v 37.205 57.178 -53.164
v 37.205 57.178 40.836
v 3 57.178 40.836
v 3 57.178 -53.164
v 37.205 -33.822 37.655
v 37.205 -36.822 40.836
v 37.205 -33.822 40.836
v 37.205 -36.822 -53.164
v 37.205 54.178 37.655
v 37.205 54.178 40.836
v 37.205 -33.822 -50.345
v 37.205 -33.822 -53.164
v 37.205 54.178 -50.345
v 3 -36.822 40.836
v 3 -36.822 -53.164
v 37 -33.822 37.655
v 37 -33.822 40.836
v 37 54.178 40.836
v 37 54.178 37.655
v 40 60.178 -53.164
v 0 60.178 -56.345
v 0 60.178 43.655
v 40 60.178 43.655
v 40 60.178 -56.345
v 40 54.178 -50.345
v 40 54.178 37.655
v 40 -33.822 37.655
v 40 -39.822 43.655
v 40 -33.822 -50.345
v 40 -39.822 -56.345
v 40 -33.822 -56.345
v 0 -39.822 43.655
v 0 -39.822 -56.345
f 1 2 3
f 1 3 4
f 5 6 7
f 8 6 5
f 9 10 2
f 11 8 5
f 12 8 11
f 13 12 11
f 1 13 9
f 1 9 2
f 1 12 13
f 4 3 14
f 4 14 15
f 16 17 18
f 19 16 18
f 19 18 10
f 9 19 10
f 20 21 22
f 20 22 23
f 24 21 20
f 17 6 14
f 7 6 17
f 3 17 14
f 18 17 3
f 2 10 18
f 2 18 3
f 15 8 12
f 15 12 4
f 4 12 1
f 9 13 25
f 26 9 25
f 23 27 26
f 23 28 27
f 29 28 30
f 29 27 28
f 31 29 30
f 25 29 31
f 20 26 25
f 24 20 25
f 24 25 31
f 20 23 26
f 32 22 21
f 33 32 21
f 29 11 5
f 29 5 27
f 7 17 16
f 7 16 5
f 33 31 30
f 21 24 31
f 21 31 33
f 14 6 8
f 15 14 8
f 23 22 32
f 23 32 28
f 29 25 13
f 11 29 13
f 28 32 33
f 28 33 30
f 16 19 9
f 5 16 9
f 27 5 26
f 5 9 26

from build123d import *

# Parameters (mm, degrees)
SKETCH_1_W          = 100
SKETCH_1_H          = 100
EXTRUDE_1_DEPTH     = 40
SKETCH_36_W         = 94
SKETCH_36_H         = 94
CUT_EXTRUDE_2_DEPTH = 37
SKETCH_4_W          = 3
SKETCH_4_H          = 88
EXTRUDE_6_DEPTH     = 6
SKETCH_52_W         = 2.795133155
SKETCH_52_H         = 88
EXTRUDE_7_DEPTH     = 6
EXTRUDE_9_DEPTH     = 6
SKETCH_57_W         = 2.795133155
SKETCH_57_H         = 94
EXTRUDE_10_DEPTH    = 6


with BuildPart() as part:
    # 草图1 → 凸台-拉伸1 (new body)
    with BuildSketch(Plane(origin=(0, 0, 0), x_dir=(0, 0, -1), z_dir=(1, 0, 0))):
        with Locations((6.345177665, 10.178154254)):
            Rectangle(SKETCH_1_W, SKETCH_1_H)
    extrude(amount=EXTRUDE_1_DEPTH)

    # 草图36 → 切除-拉伸2 (cut)
    with BuildSketch(Plane(origin=(40, 0, 0), x_dir=(0, 0, -1), z_dir=(1, 0, 0))):
        with Locations((6.163819268, 10.178154254)):
            Rectangle(SKETCH_36_W, SKETCH_36_H)
    extrude(amount=-CUT_EXTRUDE_2_DEPTH, mode=Mode.SUBTRACT)

    # 草图4 → 凸台-拉伸6 (add)
    with BuildSketch(Plane.XY.offset(43.654822335)):
        with Locations((38.5, 10.178154254)):
            Rectangle(SKETCH_4_W, SKETCH_4_H)
    extrude(amount=-EXTRUDE_6_DEPTH)

    # 草图52 → 凸台-拉伸7 (add)
    with BuildSketch(Plane(origin=(0, 0, -56.345177665), x_dir=(-1, 0, 0), z_dir=(0, 0, -1))):
        with Locations((-38.602433422, 10.178154254)):
            Rectangle(SKETCH_52_W, SKETCH_52_H)
    extrude(amount=-EXTRUDE_7_DEPTH)

    # 草图56 → 凸台-拉伸9 (add)
    with BuildSketch(Plane.XZ.offset(39.821845746)):
        Polygon((40, 40.836180732), (37.204866845, 40.836180732), (37.204866845, -53.163819268), (40, -53.163819268), (40, -50.345177665), align=None)
    extrude(amount=-EXTRUDE_9_DEPTH)

    # 草图57 → 凸台-拉伸10 (add)
    with BuildSketch(Plane(origin=(0, 60.178154254, 0), x_dir=(1, 0, 0), z_dir=(0, 1, 0))):
        with Locations((38.602433422, 6.163819268)):
            Rectangle(SKETCH_57_W, SKETCH_57_H)
    extrude(amount=-EXTRUDE_10_DEPTH)


solid = part.part
